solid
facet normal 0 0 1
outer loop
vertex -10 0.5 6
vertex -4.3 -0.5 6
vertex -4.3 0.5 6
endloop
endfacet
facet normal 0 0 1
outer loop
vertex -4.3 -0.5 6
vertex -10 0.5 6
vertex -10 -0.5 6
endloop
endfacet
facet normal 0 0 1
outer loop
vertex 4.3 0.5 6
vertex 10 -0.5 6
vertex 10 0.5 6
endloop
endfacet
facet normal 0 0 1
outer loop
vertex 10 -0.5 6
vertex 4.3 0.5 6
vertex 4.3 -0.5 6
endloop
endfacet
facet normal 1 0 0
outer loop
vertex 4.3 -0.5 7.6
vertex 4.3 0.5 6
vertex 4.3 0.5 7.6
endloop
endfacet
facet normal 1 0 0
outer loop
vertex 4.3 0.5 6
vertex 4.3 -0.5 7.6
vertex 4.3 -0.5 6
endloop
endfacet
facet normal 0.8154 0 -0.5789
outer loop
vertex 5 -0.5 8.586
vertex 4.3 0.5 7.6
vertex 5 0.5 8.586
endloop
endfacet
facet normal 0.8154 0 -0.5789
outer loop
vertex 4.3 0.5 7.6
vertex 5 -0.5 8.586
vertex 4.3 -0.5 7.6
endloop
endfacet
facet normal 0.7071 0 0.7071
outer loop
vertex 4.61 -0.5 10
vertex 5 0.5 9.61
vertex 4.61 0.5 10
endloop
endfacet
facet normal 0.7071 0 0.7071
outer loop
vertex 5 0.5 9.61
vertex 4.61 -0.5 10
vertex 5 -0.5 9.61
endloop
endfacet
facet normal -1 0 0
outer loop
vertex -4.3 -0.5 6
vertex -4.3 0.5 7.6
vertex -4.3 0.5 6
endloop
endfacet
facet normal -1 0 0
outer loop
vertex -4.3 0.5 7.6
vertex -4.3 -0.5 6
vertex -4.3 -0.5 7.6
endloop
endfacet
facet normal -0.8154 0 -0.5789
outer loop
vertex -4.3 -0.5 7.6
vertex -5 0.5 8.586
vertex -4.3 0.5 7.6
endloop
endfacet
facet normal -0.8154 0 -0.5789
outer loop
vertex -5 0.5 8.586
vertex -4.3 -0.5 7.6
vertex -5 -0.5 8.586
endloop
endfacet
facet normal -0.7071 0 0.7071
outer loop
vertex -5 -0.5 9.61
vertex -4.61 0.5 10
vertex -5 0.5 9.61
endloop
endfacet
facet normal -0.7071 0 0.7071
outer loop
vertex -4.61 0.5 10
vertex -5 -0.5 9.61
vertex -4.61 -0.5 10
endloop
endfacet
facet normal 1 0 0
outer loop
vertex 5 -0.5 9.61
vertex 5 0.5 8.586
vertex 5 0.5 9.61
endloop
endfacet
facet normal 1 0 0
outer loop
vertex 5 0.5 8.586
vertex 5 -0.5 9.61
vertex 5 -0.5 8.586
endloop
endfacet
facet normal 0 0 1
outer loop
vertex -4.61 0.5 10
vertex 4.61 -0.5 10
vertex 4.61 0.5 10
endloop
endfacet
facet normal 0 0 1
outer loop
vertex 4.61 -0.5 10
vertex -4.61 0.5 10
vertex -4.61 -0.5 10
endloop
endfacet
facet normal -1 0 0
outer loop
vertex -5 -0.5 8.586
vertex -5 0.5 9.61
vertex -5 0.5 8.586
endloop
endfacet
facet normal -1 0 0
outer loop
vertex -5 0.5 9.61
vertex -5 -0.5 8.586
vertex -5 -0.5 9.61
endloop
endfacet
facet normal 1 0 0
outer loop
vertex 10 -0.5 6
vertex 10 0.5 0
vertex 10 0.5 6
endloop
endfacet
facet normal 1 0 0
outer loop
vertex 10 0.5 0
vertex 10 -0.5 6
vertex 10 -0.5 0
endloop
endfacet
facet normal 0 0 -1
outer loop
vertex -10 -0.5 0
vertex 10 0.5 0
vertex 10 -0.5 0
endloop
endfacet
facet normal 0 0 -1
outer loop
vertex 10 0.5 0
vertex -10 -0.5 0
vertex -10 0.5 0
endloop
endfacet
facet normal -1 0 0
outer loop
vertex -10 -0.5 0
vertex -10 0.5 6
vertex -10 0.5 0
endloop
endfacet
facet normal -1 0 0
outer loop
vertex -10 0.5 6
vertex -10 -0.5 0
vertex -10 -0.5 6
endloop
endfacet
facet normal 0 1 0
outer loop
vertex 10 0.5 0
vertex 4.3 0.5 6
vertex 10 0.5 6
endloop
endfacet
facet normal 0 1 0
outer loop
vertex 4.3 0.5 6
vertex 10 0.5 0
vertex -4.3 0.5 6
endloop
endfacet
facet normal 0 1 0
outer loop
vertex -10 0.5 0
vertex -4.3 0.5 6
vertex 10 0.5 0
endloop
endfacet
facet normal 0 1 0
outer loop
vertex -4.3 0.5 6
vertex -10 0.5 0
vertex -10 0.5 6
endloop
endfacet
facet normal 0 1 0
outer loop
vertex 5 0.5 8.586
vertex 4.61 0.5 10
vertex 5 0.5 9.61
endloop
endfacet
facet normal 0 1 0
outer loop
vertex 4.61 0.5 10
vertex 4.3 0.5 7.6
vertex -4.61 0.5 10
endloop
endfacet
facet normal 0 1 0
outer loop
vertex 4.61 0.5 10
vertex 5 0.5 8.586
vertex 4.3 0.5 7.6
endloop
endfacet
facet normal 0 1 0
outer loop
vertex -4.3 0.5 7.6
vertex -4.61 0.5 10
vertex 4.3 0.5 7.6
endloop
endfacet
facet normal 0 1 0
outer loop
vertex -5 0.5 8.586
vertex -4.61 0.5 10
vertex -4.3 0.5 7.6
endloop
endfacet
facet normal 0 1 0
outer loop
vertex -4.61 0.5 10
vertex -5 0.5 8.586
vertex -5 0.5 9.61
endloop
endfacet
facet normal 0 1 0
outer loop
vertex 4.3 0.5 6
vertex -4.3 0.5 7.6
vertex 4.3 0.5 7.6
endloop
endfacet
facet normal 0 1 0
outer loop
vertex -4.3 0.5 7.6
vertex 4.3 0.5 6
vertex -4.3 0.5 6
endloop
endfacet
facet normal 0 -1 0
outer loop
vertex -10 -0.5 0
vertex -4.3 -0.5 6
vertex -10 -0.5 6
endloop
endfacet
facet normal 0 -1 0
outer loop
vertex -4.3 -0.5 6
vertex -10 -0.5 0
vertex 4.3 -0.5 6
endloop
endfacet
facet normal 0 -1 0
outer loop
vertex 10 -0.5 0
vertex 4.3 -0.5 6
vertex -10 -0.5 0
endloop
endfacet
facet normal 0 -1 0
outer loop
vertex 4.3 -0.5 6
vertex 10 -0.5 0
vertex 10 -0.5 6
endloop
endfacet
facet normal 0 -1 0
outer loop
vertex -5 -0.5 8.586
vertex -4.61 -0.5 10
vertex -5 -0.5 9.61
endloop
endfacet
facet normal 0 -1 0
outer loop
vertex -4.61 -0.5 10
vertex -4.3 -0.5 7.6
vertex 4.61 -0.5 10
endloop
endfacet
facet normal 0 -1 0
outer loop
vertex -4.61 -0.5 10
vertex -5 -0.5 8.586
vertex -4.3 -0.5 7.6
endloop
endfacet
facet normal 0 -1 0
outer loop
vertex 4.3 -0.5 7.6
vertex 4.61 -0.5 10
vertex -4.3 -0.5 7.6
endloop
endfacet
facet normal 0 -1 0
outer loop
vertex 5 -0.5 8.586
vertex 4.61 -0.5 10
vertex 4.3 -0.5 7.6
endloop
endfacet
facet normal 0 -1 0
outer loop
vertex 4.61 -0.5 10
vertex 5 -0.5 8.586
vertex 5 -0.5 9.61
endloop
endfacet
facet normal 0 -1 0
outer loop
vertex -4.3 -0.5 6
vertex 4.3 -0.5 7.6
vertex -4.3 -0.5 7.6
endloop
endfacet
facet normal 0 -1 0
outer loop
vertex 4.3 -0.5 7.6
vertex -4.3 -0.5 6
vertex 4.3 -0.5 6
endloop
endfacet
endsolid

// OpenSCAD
// file: ../lib/BOSL2/std.scad
// Minimal BOSL2 compatibility shim for bundled gallery models.
// It implements only the helpers used by the imported OpenSCAD projects.

CENTER = [0, 0, 0];
BOTTOM = [0, 0, -1];
TOP = [0, 0, 1];
LEFT = [-1, 0, 0];
RIGHT = [1, 0, 0];
FRONT = [0, -1, 0];
BACK = [0, 1, 0];

module up(z=0) {
    translate([0, 0, z]) children();
}

module down(z=0) {
    translate([0, 0, -z]) children();
}

module attach(anchor=CENTER) {
    children();
}

module cuboid(size=[1, 1, 1], anchor=CENTER) {
    center = anchor == CENTER;
    translate(center ? [0, 0, 0] : [0, 0, size[2] / 2])
        cube(size, center=true);
    children();
}

module xcyl(h=1, r=1, anchor=CENTER) {
    center = anchor == CENTER;
    translate(center ? [0, 0, 0] : [h / 2, 0, 0])
        rotate([0, 90, 0])
            cylinder(h=h, r=r, center=true);
}
// main file
include <../lib/node_interface.scad>
node_receiver_retention_profile(1);
